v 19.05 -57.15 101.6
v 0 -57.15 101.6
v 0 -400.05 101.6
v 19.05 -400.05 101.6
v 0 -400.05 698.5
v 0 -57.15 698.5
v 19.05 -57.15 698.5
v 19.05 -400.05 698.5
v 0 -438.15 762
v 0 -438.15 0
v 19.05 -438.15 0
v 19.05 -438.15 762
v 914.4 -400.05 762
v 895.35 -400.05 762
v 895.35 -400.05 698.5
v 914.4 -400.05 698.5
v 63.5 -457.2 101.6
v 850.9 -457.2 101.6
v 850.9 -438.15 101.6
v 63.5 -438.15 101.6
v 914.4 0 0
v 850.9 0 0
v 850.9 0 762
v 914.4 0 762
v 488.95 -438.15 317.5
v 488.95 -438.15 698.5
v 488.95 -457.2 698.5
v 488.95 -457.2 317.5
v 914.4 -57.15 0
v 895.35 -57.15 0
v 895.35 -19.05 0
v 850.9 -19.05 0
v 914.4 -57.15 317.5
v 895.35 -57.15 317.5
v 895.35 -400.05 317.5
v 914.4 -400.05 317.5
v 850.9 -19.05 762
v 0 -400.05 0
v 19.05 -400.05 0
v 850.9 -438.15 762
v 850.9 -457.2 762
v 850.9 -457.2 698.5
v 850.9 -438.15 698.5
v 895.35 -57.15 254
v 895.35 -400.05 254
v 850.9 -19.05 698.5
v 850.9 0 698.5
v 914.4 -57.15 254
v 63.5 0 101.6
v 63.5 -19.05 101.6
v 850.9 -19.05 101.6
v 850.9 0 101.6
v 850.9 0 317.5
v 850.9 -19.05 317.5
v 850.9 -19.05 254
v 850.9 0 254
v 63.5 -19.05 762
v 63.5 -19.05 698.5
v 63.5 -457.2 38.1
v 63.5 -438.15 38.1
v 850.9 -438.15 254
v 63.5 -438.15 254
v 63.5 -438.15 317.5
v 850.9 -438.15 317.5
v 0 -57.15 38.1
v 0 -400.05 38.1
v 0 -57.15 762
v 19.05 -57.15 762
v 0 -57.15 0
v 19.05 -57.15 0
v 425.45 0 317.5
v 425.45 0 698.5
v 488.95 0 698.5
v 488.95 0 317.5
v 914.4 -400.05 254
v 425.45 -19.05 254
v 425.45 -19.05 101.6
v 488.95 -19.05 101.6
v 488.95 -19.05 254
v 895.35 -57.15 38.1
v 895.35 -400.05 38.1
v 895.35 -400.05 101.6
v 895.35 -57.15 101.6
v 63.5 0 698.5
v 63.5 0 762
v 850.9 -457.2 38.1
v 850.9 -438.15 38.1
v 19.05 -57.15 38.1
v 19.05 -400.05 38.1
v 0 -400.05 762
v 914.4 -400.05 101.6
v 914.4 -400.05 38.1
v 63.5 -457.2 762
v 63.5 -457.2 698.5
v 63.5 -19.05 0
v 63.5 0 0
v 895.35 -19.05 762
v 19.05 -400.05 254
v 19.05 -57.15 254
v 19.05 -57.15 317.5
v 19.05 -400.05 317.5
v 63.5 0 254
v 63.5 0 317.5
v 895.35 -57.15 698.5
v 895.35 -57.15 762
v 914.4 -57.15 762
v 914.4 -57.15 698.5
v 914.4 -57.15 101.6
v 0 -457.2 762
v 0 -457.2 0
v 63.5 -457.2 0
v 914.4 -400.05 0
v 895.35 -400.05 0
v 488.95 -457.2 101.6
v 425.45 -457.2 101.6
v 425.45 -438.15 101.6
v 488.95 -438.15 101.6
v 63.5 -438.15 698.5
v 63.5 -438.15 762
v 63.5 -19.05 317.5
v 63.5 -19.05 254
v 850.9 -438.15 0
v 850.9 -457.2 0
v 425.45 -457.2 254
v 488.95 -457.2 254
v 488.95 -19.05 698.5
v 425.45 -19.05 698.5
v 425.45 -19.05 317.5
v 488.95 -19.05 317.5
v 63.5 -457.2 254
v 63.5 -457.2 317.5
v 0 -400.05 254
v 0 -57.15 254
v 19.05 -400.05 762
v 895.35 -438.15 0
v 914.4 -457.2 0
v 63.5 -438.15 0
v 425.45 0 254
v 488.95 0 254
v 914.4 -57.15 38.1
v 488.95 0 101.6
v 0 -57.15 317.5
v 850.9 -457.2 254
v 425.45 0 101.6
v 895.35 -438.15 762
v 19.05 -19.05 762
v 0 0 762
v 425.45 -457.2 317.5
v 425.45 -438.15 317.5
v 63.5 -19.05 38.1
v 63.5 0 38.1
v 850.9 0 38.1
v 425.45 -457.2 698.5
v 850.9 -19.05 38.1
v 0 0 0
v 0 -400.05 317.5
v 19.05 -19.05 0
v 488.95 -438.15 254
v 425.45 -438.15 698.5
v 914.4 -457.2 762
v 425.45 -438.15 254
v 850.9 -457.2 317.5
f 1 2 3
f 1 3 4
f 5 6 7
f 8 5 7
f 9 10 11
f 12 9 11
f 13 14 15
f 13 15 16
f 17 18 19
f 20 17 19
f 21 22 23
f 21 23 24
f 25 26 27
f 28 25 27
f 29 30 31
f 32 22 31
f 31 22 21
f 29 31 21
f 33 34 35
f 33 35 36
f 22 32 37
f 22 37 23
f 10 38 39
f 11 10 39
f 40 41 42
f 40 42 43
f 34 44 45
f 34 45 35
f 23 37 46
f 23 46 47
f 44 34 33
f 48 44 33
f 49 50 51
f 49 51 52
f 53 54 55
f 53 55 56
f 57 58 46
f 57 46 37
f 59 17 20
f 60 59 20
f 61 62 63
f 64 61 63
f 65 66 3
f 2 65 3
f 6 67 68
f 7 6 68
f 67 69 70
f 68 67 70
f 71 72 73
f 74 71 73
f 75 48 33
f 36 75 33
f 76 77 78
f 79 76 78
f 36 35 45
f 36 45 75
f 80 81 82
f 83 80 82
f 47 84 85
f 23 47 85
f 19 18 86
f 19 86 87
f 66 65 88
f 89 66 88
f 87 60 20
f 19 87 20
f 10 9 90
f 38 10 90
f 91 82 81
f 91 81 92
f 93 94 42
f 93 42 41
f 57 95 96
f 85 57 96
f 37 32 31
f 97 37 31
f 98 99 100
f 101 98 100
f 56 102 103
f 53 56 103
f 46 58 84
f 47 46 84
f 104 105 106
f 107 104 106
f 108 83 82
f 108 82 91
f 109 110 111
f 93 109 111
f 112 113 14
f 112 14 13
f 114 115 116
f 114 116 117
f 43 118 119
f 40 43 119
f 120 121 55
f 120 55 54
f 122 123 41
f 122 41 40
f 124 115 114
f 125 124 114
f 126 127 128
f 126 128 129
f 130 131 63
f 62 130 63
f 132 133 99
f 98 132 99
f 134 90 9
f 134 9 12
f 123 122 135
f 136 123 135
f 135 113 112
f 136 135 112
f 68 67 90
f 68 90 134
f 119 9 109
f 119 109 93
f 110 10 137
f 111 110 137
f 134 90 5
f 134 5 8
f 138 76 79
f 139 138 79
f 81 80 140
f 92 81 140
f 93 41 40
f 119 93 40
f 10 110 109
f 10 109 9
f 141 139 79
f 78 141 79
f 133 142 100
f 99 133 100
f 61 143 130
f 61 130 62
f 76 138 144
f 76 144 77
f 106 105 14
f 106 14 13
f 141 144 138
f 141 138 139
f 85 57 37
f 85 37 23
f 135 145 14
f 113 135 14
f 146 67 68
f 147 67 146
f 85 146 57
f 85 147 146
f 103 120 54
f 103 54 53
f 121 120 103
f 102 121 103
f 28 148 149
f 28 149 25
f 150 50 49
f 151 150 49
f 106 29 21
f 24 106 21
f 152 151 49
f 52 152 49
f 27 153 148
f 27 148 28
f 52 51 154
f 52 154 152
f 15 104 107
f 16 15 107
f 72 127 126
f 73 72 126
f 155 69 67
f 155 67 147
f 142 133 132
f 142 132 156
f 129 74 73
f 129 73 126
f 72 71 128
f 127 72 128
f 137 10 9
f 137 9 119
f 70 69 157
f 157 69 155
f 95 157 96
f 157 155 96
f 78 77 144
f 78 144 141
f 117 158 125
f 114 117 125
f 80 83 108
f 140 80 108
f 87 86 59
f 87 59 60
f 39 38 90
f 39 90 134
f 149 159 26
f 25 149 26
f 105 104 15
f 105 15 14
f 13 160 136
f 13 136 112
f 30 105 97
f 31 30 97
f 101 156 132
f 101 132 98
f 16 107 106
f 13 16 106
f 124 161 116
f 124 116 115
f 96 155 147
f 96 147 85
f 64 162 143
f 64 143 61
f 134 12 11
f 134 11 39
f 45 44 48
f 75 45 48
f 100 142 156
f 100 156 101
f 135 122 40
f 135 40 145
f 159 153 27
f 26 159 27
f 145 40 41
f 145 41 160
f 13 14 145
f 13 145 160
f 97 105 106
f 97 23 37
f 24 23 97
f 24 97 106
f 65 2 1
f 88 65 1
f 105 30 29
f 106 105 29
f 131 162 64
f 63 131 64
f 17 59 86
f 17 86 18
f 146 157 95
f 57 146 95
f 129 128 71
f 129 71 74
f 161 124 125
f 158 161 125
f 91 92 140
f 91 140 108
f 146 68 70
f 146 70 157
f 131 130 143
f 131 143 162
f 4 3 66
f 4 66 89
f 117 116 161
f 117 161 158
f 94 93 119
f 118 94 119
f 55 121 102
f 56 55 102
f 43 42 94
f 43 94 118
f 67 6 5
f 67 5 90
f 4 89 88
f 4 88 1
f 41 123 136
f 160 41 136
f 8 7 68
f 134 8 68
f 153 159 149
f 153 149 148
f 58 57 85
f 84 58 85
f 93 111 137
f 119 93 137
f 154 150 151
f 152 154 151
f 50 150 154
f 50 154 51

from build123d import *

# Parameters (mm, degrees)
F0_W      = 63.5
F0_H      = 19.05
F1_DEPTH  = 762
F2_W      = 19.05
F2_H      = 38.1
F3_DEPTH  = 762
F4_W      = 63.5
F4_H      = 19.05
F10_DEPTH = 762
F5_W      = 19.05
F5_H      = 38.1
F11_DEPTH = 762
F6_W      = 63.5
F6_H      = 19.05
F12_DEPTH = 762
F7_W      = 19.05
F7_H      = 38.1
F13_DEPTH = 762
F8_W      = 63.5
F8_H      = 19.05
F14_DEPTH = 762
F9_W      = 19.05
F9_H      = 38.1
F15_DEPTH = 762
F16_W     = 19.05
F16_H     = 63.5
F17_DEPTH = 787.4
F18_W     = 19.05
F18_H     = 63.5
F19_DEPTH = 787.4
F20_W     = 19.05
F20_H     = 63.5
F21_DEPTH = 342.9
F22_W     = 19.05
F22_H     = 63.5
F23_DEPTH = 342.9
F24_W     = 63.5
F24_H     = 19.05
F25_DEPTH = 381
F26_W     = 63.5
F26_H     = 19.05
F27_DEPTH = 381
F28_W     = 63.5
F28_H     = 19.05
F29_DEPTH = 152.4
F30_W     = 63.5
F30_H     = 19.05
F31_DEPTH = 152.4


with BuildPart() as f1:
    # F0 (on Top) → F1 (new body)
    with BuildSketch(Plane.XY):
        with Locations((31.75, -9.525)):
            Rectangle(F0_W, F0_H)
    extrude(amount=F1_DEPTH)

    # F2 (on Top) → F3 (join)
    with BuildSketch(Plane.XY):
        with Locations((9.525, -38.1)):
            Rectangle(F2_W, F2_H)
    extrude(amount=F3_DEPTH)


with BuildPart() as f10:
    # F4 (on Top) → F10 (new body)
    with BuildSketch(Plane.XY):
        with Locations((31.75, -447.675)):
            Rectangle(F4_W, F4_H)
    extrude(amount=F10_DEPTH)


with BuildPart() as f11:
    # F5 (on Top) → F11 (new body)
    with BuildSketch(Plane.XY):
        with Locations((9.525, -419.1)):
            Rectangle(F5_W, F5_H)
    extrude(amount=F11_DEPTH)


with BuildPart() as f12:
    # F6 (on Top) → F12 (new body)
    with BuildSketch(Plane.XY):
        with Locations((882.65, -9.525)):
            Rectangle(F6_W, F6_H)
    extrude(amount=F12_DEPTH)

    # F7 (on Top) → F13 (join)
    with BuildSketch(Plane.XY):
        with Locations((904.875, -38.1)):
            Rectangle(F7_W, F7_H)
    extrude(amount=F13_DEPTH)


with BuildPart() as f14:
    # F8 (on Top) → F14 (new body)
    with BuildSketch(Plane.XY):
        with Locations((882.65, -447.675)):
            Rectangle(F8_W, F8_H)
    extrude(amount=F14_DEPTH)

    # F9 (on Top) → F15 (join)
    with BuildSketch(Plane.XY):
        with Locations((904.875, -419.1)):
            Rectangle(F9_W, F9_H)
    extrude(amount=F15_DEPTH)


with BuildPart() as f17:
    # F16 (on face) → F17 (new body)
    with BuildSketch(Plane.YZ.offset(63.5)):
        with Locations((-447.675, 730.25)):
            Rectangle(F16_W, F16_H)
        with Locations((-447.675, 285.75)):
            Rectangle(F16_W, F16_H)
        with Locations((-447.675, 69.85)):
            Rectangle(F16_W, F16_H)
    extrude(amount=F17_DEPTH)


with BuildPart() as f19:
    # F18 (on face) → F19 (new body)
    with BuildSketch(Plane.YZ.offset(63.5)):
        with Locations((-9.525, 730.25)):
            Rectangle(F18_W, F18_H)
        with Locations((-9.525, 285.75)):
            Rectangle(F18_W, F18_H)
        with Locations((-9.525, 69.85)):
            Rectangle(F18_W, F18_H)
    extrude(amount=F19_DEPTH)


with BuildPart() as f21:
    # F20 (on face) → F21 (new body)
    with BuildSketch(Plane.XZ.offset(57.15)):
        with Locations((904.875, 730.25)):
            Rectangle(F20_W, F20_H)
        with Locations((904.875, 285.75)):
            Rectangle(F20_W, F20_H)
        with Locations((904.875, 69.85)):
            Rectangle(F20_W, F20_H)
    extrude(amount=F21_DEPTH)


with BuildPart() as f23:
    # F22 (on face) → F23 (new body)
    with BuildSketch(Plane.XZ.offset(57.15)):
        with Locations((9.525, 730.25)):
            Rectangle(F22_W, F22_H)
        with Locations((9.525, 285.75)):
            Rectangle(F22_W, F22_H)
        with Locations((9.525, 69.85)):
            Rectangle(F22_W, F22_H)
    extrude(amount=F23_DEPTH)


with BuildPart() as f25:
    # F24 (on face) → F25 (new body)
    with BuildSketch(Plane(origin=(0, 0, 698.5), x_dir=(1, 0, 0), z_dir=(0, 0, -1))):
        with Locations((457.2, 447.675)):
            Rectangle(F24_W, F24_H)
    extrude(amount=F25_DEPTH)


with BuildPart() as f27:
    # F26 (on face) → F27 (new body)
    with BuildSketch(Plane(origin=(0, 0, 698.5), x_dir=(1, 0, 0), z_dir=(0, 0, -1))):
        with Locations((457.2, 9.525)):
            Rectangle(F26_W, F26_H)
    extrude(amount=F27_DEPTH)


with BuildPart() as f29:
    # F28 (on face) → F29 (new body)
    with BuildSketch(Plane(origin=(0, 0, 254), x_dir=(1, 0, 0), z_dir=(0, 0, -1))):
        with Locations((457.2, 447.675)):
            Rectangle(F28_W, F28_H)
    extrude(amount=F29_DEPTH)


with BuildPart() as f31:
    # F30 (on face) → F31 (new body)
    with BuildSketch(Plane(origin=(0, 0, 254), x_dir=(1, 0, 0), z_dir=(0, 0, -1))):
        with Locations((457.2, 9.525)):
            Rectangle(F30_W, F30_H)
    extrude(amount=F31_DEPTH)


solid = Compound([f1.part, f10.part, f11.part, f12.part, f14.part, f17.part, f19.part, f21.part, f23.part, f25.part, f27.part, f29.part, f31.part])
